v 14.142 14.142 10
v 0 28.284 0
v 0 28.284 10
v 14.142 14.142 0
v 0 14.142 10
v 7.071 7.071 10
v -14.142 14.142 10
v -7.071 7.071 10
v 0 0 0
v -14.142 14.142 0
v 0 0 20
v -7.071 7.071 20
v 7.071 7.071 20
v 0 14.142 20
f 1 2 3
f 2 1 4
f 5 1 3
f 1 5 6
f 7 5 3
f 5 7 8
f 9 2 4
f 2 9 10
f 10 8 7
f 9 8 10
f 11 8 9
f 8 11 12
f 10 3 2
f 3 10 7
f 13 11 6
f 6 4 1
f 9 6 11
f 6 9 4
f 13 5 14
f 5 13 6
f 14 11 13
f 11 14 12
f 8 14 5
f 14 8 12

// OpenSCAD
        rotate([0,0,45]) {
            cube([20,20,10]);
            cube([10,10,20]);
        }
